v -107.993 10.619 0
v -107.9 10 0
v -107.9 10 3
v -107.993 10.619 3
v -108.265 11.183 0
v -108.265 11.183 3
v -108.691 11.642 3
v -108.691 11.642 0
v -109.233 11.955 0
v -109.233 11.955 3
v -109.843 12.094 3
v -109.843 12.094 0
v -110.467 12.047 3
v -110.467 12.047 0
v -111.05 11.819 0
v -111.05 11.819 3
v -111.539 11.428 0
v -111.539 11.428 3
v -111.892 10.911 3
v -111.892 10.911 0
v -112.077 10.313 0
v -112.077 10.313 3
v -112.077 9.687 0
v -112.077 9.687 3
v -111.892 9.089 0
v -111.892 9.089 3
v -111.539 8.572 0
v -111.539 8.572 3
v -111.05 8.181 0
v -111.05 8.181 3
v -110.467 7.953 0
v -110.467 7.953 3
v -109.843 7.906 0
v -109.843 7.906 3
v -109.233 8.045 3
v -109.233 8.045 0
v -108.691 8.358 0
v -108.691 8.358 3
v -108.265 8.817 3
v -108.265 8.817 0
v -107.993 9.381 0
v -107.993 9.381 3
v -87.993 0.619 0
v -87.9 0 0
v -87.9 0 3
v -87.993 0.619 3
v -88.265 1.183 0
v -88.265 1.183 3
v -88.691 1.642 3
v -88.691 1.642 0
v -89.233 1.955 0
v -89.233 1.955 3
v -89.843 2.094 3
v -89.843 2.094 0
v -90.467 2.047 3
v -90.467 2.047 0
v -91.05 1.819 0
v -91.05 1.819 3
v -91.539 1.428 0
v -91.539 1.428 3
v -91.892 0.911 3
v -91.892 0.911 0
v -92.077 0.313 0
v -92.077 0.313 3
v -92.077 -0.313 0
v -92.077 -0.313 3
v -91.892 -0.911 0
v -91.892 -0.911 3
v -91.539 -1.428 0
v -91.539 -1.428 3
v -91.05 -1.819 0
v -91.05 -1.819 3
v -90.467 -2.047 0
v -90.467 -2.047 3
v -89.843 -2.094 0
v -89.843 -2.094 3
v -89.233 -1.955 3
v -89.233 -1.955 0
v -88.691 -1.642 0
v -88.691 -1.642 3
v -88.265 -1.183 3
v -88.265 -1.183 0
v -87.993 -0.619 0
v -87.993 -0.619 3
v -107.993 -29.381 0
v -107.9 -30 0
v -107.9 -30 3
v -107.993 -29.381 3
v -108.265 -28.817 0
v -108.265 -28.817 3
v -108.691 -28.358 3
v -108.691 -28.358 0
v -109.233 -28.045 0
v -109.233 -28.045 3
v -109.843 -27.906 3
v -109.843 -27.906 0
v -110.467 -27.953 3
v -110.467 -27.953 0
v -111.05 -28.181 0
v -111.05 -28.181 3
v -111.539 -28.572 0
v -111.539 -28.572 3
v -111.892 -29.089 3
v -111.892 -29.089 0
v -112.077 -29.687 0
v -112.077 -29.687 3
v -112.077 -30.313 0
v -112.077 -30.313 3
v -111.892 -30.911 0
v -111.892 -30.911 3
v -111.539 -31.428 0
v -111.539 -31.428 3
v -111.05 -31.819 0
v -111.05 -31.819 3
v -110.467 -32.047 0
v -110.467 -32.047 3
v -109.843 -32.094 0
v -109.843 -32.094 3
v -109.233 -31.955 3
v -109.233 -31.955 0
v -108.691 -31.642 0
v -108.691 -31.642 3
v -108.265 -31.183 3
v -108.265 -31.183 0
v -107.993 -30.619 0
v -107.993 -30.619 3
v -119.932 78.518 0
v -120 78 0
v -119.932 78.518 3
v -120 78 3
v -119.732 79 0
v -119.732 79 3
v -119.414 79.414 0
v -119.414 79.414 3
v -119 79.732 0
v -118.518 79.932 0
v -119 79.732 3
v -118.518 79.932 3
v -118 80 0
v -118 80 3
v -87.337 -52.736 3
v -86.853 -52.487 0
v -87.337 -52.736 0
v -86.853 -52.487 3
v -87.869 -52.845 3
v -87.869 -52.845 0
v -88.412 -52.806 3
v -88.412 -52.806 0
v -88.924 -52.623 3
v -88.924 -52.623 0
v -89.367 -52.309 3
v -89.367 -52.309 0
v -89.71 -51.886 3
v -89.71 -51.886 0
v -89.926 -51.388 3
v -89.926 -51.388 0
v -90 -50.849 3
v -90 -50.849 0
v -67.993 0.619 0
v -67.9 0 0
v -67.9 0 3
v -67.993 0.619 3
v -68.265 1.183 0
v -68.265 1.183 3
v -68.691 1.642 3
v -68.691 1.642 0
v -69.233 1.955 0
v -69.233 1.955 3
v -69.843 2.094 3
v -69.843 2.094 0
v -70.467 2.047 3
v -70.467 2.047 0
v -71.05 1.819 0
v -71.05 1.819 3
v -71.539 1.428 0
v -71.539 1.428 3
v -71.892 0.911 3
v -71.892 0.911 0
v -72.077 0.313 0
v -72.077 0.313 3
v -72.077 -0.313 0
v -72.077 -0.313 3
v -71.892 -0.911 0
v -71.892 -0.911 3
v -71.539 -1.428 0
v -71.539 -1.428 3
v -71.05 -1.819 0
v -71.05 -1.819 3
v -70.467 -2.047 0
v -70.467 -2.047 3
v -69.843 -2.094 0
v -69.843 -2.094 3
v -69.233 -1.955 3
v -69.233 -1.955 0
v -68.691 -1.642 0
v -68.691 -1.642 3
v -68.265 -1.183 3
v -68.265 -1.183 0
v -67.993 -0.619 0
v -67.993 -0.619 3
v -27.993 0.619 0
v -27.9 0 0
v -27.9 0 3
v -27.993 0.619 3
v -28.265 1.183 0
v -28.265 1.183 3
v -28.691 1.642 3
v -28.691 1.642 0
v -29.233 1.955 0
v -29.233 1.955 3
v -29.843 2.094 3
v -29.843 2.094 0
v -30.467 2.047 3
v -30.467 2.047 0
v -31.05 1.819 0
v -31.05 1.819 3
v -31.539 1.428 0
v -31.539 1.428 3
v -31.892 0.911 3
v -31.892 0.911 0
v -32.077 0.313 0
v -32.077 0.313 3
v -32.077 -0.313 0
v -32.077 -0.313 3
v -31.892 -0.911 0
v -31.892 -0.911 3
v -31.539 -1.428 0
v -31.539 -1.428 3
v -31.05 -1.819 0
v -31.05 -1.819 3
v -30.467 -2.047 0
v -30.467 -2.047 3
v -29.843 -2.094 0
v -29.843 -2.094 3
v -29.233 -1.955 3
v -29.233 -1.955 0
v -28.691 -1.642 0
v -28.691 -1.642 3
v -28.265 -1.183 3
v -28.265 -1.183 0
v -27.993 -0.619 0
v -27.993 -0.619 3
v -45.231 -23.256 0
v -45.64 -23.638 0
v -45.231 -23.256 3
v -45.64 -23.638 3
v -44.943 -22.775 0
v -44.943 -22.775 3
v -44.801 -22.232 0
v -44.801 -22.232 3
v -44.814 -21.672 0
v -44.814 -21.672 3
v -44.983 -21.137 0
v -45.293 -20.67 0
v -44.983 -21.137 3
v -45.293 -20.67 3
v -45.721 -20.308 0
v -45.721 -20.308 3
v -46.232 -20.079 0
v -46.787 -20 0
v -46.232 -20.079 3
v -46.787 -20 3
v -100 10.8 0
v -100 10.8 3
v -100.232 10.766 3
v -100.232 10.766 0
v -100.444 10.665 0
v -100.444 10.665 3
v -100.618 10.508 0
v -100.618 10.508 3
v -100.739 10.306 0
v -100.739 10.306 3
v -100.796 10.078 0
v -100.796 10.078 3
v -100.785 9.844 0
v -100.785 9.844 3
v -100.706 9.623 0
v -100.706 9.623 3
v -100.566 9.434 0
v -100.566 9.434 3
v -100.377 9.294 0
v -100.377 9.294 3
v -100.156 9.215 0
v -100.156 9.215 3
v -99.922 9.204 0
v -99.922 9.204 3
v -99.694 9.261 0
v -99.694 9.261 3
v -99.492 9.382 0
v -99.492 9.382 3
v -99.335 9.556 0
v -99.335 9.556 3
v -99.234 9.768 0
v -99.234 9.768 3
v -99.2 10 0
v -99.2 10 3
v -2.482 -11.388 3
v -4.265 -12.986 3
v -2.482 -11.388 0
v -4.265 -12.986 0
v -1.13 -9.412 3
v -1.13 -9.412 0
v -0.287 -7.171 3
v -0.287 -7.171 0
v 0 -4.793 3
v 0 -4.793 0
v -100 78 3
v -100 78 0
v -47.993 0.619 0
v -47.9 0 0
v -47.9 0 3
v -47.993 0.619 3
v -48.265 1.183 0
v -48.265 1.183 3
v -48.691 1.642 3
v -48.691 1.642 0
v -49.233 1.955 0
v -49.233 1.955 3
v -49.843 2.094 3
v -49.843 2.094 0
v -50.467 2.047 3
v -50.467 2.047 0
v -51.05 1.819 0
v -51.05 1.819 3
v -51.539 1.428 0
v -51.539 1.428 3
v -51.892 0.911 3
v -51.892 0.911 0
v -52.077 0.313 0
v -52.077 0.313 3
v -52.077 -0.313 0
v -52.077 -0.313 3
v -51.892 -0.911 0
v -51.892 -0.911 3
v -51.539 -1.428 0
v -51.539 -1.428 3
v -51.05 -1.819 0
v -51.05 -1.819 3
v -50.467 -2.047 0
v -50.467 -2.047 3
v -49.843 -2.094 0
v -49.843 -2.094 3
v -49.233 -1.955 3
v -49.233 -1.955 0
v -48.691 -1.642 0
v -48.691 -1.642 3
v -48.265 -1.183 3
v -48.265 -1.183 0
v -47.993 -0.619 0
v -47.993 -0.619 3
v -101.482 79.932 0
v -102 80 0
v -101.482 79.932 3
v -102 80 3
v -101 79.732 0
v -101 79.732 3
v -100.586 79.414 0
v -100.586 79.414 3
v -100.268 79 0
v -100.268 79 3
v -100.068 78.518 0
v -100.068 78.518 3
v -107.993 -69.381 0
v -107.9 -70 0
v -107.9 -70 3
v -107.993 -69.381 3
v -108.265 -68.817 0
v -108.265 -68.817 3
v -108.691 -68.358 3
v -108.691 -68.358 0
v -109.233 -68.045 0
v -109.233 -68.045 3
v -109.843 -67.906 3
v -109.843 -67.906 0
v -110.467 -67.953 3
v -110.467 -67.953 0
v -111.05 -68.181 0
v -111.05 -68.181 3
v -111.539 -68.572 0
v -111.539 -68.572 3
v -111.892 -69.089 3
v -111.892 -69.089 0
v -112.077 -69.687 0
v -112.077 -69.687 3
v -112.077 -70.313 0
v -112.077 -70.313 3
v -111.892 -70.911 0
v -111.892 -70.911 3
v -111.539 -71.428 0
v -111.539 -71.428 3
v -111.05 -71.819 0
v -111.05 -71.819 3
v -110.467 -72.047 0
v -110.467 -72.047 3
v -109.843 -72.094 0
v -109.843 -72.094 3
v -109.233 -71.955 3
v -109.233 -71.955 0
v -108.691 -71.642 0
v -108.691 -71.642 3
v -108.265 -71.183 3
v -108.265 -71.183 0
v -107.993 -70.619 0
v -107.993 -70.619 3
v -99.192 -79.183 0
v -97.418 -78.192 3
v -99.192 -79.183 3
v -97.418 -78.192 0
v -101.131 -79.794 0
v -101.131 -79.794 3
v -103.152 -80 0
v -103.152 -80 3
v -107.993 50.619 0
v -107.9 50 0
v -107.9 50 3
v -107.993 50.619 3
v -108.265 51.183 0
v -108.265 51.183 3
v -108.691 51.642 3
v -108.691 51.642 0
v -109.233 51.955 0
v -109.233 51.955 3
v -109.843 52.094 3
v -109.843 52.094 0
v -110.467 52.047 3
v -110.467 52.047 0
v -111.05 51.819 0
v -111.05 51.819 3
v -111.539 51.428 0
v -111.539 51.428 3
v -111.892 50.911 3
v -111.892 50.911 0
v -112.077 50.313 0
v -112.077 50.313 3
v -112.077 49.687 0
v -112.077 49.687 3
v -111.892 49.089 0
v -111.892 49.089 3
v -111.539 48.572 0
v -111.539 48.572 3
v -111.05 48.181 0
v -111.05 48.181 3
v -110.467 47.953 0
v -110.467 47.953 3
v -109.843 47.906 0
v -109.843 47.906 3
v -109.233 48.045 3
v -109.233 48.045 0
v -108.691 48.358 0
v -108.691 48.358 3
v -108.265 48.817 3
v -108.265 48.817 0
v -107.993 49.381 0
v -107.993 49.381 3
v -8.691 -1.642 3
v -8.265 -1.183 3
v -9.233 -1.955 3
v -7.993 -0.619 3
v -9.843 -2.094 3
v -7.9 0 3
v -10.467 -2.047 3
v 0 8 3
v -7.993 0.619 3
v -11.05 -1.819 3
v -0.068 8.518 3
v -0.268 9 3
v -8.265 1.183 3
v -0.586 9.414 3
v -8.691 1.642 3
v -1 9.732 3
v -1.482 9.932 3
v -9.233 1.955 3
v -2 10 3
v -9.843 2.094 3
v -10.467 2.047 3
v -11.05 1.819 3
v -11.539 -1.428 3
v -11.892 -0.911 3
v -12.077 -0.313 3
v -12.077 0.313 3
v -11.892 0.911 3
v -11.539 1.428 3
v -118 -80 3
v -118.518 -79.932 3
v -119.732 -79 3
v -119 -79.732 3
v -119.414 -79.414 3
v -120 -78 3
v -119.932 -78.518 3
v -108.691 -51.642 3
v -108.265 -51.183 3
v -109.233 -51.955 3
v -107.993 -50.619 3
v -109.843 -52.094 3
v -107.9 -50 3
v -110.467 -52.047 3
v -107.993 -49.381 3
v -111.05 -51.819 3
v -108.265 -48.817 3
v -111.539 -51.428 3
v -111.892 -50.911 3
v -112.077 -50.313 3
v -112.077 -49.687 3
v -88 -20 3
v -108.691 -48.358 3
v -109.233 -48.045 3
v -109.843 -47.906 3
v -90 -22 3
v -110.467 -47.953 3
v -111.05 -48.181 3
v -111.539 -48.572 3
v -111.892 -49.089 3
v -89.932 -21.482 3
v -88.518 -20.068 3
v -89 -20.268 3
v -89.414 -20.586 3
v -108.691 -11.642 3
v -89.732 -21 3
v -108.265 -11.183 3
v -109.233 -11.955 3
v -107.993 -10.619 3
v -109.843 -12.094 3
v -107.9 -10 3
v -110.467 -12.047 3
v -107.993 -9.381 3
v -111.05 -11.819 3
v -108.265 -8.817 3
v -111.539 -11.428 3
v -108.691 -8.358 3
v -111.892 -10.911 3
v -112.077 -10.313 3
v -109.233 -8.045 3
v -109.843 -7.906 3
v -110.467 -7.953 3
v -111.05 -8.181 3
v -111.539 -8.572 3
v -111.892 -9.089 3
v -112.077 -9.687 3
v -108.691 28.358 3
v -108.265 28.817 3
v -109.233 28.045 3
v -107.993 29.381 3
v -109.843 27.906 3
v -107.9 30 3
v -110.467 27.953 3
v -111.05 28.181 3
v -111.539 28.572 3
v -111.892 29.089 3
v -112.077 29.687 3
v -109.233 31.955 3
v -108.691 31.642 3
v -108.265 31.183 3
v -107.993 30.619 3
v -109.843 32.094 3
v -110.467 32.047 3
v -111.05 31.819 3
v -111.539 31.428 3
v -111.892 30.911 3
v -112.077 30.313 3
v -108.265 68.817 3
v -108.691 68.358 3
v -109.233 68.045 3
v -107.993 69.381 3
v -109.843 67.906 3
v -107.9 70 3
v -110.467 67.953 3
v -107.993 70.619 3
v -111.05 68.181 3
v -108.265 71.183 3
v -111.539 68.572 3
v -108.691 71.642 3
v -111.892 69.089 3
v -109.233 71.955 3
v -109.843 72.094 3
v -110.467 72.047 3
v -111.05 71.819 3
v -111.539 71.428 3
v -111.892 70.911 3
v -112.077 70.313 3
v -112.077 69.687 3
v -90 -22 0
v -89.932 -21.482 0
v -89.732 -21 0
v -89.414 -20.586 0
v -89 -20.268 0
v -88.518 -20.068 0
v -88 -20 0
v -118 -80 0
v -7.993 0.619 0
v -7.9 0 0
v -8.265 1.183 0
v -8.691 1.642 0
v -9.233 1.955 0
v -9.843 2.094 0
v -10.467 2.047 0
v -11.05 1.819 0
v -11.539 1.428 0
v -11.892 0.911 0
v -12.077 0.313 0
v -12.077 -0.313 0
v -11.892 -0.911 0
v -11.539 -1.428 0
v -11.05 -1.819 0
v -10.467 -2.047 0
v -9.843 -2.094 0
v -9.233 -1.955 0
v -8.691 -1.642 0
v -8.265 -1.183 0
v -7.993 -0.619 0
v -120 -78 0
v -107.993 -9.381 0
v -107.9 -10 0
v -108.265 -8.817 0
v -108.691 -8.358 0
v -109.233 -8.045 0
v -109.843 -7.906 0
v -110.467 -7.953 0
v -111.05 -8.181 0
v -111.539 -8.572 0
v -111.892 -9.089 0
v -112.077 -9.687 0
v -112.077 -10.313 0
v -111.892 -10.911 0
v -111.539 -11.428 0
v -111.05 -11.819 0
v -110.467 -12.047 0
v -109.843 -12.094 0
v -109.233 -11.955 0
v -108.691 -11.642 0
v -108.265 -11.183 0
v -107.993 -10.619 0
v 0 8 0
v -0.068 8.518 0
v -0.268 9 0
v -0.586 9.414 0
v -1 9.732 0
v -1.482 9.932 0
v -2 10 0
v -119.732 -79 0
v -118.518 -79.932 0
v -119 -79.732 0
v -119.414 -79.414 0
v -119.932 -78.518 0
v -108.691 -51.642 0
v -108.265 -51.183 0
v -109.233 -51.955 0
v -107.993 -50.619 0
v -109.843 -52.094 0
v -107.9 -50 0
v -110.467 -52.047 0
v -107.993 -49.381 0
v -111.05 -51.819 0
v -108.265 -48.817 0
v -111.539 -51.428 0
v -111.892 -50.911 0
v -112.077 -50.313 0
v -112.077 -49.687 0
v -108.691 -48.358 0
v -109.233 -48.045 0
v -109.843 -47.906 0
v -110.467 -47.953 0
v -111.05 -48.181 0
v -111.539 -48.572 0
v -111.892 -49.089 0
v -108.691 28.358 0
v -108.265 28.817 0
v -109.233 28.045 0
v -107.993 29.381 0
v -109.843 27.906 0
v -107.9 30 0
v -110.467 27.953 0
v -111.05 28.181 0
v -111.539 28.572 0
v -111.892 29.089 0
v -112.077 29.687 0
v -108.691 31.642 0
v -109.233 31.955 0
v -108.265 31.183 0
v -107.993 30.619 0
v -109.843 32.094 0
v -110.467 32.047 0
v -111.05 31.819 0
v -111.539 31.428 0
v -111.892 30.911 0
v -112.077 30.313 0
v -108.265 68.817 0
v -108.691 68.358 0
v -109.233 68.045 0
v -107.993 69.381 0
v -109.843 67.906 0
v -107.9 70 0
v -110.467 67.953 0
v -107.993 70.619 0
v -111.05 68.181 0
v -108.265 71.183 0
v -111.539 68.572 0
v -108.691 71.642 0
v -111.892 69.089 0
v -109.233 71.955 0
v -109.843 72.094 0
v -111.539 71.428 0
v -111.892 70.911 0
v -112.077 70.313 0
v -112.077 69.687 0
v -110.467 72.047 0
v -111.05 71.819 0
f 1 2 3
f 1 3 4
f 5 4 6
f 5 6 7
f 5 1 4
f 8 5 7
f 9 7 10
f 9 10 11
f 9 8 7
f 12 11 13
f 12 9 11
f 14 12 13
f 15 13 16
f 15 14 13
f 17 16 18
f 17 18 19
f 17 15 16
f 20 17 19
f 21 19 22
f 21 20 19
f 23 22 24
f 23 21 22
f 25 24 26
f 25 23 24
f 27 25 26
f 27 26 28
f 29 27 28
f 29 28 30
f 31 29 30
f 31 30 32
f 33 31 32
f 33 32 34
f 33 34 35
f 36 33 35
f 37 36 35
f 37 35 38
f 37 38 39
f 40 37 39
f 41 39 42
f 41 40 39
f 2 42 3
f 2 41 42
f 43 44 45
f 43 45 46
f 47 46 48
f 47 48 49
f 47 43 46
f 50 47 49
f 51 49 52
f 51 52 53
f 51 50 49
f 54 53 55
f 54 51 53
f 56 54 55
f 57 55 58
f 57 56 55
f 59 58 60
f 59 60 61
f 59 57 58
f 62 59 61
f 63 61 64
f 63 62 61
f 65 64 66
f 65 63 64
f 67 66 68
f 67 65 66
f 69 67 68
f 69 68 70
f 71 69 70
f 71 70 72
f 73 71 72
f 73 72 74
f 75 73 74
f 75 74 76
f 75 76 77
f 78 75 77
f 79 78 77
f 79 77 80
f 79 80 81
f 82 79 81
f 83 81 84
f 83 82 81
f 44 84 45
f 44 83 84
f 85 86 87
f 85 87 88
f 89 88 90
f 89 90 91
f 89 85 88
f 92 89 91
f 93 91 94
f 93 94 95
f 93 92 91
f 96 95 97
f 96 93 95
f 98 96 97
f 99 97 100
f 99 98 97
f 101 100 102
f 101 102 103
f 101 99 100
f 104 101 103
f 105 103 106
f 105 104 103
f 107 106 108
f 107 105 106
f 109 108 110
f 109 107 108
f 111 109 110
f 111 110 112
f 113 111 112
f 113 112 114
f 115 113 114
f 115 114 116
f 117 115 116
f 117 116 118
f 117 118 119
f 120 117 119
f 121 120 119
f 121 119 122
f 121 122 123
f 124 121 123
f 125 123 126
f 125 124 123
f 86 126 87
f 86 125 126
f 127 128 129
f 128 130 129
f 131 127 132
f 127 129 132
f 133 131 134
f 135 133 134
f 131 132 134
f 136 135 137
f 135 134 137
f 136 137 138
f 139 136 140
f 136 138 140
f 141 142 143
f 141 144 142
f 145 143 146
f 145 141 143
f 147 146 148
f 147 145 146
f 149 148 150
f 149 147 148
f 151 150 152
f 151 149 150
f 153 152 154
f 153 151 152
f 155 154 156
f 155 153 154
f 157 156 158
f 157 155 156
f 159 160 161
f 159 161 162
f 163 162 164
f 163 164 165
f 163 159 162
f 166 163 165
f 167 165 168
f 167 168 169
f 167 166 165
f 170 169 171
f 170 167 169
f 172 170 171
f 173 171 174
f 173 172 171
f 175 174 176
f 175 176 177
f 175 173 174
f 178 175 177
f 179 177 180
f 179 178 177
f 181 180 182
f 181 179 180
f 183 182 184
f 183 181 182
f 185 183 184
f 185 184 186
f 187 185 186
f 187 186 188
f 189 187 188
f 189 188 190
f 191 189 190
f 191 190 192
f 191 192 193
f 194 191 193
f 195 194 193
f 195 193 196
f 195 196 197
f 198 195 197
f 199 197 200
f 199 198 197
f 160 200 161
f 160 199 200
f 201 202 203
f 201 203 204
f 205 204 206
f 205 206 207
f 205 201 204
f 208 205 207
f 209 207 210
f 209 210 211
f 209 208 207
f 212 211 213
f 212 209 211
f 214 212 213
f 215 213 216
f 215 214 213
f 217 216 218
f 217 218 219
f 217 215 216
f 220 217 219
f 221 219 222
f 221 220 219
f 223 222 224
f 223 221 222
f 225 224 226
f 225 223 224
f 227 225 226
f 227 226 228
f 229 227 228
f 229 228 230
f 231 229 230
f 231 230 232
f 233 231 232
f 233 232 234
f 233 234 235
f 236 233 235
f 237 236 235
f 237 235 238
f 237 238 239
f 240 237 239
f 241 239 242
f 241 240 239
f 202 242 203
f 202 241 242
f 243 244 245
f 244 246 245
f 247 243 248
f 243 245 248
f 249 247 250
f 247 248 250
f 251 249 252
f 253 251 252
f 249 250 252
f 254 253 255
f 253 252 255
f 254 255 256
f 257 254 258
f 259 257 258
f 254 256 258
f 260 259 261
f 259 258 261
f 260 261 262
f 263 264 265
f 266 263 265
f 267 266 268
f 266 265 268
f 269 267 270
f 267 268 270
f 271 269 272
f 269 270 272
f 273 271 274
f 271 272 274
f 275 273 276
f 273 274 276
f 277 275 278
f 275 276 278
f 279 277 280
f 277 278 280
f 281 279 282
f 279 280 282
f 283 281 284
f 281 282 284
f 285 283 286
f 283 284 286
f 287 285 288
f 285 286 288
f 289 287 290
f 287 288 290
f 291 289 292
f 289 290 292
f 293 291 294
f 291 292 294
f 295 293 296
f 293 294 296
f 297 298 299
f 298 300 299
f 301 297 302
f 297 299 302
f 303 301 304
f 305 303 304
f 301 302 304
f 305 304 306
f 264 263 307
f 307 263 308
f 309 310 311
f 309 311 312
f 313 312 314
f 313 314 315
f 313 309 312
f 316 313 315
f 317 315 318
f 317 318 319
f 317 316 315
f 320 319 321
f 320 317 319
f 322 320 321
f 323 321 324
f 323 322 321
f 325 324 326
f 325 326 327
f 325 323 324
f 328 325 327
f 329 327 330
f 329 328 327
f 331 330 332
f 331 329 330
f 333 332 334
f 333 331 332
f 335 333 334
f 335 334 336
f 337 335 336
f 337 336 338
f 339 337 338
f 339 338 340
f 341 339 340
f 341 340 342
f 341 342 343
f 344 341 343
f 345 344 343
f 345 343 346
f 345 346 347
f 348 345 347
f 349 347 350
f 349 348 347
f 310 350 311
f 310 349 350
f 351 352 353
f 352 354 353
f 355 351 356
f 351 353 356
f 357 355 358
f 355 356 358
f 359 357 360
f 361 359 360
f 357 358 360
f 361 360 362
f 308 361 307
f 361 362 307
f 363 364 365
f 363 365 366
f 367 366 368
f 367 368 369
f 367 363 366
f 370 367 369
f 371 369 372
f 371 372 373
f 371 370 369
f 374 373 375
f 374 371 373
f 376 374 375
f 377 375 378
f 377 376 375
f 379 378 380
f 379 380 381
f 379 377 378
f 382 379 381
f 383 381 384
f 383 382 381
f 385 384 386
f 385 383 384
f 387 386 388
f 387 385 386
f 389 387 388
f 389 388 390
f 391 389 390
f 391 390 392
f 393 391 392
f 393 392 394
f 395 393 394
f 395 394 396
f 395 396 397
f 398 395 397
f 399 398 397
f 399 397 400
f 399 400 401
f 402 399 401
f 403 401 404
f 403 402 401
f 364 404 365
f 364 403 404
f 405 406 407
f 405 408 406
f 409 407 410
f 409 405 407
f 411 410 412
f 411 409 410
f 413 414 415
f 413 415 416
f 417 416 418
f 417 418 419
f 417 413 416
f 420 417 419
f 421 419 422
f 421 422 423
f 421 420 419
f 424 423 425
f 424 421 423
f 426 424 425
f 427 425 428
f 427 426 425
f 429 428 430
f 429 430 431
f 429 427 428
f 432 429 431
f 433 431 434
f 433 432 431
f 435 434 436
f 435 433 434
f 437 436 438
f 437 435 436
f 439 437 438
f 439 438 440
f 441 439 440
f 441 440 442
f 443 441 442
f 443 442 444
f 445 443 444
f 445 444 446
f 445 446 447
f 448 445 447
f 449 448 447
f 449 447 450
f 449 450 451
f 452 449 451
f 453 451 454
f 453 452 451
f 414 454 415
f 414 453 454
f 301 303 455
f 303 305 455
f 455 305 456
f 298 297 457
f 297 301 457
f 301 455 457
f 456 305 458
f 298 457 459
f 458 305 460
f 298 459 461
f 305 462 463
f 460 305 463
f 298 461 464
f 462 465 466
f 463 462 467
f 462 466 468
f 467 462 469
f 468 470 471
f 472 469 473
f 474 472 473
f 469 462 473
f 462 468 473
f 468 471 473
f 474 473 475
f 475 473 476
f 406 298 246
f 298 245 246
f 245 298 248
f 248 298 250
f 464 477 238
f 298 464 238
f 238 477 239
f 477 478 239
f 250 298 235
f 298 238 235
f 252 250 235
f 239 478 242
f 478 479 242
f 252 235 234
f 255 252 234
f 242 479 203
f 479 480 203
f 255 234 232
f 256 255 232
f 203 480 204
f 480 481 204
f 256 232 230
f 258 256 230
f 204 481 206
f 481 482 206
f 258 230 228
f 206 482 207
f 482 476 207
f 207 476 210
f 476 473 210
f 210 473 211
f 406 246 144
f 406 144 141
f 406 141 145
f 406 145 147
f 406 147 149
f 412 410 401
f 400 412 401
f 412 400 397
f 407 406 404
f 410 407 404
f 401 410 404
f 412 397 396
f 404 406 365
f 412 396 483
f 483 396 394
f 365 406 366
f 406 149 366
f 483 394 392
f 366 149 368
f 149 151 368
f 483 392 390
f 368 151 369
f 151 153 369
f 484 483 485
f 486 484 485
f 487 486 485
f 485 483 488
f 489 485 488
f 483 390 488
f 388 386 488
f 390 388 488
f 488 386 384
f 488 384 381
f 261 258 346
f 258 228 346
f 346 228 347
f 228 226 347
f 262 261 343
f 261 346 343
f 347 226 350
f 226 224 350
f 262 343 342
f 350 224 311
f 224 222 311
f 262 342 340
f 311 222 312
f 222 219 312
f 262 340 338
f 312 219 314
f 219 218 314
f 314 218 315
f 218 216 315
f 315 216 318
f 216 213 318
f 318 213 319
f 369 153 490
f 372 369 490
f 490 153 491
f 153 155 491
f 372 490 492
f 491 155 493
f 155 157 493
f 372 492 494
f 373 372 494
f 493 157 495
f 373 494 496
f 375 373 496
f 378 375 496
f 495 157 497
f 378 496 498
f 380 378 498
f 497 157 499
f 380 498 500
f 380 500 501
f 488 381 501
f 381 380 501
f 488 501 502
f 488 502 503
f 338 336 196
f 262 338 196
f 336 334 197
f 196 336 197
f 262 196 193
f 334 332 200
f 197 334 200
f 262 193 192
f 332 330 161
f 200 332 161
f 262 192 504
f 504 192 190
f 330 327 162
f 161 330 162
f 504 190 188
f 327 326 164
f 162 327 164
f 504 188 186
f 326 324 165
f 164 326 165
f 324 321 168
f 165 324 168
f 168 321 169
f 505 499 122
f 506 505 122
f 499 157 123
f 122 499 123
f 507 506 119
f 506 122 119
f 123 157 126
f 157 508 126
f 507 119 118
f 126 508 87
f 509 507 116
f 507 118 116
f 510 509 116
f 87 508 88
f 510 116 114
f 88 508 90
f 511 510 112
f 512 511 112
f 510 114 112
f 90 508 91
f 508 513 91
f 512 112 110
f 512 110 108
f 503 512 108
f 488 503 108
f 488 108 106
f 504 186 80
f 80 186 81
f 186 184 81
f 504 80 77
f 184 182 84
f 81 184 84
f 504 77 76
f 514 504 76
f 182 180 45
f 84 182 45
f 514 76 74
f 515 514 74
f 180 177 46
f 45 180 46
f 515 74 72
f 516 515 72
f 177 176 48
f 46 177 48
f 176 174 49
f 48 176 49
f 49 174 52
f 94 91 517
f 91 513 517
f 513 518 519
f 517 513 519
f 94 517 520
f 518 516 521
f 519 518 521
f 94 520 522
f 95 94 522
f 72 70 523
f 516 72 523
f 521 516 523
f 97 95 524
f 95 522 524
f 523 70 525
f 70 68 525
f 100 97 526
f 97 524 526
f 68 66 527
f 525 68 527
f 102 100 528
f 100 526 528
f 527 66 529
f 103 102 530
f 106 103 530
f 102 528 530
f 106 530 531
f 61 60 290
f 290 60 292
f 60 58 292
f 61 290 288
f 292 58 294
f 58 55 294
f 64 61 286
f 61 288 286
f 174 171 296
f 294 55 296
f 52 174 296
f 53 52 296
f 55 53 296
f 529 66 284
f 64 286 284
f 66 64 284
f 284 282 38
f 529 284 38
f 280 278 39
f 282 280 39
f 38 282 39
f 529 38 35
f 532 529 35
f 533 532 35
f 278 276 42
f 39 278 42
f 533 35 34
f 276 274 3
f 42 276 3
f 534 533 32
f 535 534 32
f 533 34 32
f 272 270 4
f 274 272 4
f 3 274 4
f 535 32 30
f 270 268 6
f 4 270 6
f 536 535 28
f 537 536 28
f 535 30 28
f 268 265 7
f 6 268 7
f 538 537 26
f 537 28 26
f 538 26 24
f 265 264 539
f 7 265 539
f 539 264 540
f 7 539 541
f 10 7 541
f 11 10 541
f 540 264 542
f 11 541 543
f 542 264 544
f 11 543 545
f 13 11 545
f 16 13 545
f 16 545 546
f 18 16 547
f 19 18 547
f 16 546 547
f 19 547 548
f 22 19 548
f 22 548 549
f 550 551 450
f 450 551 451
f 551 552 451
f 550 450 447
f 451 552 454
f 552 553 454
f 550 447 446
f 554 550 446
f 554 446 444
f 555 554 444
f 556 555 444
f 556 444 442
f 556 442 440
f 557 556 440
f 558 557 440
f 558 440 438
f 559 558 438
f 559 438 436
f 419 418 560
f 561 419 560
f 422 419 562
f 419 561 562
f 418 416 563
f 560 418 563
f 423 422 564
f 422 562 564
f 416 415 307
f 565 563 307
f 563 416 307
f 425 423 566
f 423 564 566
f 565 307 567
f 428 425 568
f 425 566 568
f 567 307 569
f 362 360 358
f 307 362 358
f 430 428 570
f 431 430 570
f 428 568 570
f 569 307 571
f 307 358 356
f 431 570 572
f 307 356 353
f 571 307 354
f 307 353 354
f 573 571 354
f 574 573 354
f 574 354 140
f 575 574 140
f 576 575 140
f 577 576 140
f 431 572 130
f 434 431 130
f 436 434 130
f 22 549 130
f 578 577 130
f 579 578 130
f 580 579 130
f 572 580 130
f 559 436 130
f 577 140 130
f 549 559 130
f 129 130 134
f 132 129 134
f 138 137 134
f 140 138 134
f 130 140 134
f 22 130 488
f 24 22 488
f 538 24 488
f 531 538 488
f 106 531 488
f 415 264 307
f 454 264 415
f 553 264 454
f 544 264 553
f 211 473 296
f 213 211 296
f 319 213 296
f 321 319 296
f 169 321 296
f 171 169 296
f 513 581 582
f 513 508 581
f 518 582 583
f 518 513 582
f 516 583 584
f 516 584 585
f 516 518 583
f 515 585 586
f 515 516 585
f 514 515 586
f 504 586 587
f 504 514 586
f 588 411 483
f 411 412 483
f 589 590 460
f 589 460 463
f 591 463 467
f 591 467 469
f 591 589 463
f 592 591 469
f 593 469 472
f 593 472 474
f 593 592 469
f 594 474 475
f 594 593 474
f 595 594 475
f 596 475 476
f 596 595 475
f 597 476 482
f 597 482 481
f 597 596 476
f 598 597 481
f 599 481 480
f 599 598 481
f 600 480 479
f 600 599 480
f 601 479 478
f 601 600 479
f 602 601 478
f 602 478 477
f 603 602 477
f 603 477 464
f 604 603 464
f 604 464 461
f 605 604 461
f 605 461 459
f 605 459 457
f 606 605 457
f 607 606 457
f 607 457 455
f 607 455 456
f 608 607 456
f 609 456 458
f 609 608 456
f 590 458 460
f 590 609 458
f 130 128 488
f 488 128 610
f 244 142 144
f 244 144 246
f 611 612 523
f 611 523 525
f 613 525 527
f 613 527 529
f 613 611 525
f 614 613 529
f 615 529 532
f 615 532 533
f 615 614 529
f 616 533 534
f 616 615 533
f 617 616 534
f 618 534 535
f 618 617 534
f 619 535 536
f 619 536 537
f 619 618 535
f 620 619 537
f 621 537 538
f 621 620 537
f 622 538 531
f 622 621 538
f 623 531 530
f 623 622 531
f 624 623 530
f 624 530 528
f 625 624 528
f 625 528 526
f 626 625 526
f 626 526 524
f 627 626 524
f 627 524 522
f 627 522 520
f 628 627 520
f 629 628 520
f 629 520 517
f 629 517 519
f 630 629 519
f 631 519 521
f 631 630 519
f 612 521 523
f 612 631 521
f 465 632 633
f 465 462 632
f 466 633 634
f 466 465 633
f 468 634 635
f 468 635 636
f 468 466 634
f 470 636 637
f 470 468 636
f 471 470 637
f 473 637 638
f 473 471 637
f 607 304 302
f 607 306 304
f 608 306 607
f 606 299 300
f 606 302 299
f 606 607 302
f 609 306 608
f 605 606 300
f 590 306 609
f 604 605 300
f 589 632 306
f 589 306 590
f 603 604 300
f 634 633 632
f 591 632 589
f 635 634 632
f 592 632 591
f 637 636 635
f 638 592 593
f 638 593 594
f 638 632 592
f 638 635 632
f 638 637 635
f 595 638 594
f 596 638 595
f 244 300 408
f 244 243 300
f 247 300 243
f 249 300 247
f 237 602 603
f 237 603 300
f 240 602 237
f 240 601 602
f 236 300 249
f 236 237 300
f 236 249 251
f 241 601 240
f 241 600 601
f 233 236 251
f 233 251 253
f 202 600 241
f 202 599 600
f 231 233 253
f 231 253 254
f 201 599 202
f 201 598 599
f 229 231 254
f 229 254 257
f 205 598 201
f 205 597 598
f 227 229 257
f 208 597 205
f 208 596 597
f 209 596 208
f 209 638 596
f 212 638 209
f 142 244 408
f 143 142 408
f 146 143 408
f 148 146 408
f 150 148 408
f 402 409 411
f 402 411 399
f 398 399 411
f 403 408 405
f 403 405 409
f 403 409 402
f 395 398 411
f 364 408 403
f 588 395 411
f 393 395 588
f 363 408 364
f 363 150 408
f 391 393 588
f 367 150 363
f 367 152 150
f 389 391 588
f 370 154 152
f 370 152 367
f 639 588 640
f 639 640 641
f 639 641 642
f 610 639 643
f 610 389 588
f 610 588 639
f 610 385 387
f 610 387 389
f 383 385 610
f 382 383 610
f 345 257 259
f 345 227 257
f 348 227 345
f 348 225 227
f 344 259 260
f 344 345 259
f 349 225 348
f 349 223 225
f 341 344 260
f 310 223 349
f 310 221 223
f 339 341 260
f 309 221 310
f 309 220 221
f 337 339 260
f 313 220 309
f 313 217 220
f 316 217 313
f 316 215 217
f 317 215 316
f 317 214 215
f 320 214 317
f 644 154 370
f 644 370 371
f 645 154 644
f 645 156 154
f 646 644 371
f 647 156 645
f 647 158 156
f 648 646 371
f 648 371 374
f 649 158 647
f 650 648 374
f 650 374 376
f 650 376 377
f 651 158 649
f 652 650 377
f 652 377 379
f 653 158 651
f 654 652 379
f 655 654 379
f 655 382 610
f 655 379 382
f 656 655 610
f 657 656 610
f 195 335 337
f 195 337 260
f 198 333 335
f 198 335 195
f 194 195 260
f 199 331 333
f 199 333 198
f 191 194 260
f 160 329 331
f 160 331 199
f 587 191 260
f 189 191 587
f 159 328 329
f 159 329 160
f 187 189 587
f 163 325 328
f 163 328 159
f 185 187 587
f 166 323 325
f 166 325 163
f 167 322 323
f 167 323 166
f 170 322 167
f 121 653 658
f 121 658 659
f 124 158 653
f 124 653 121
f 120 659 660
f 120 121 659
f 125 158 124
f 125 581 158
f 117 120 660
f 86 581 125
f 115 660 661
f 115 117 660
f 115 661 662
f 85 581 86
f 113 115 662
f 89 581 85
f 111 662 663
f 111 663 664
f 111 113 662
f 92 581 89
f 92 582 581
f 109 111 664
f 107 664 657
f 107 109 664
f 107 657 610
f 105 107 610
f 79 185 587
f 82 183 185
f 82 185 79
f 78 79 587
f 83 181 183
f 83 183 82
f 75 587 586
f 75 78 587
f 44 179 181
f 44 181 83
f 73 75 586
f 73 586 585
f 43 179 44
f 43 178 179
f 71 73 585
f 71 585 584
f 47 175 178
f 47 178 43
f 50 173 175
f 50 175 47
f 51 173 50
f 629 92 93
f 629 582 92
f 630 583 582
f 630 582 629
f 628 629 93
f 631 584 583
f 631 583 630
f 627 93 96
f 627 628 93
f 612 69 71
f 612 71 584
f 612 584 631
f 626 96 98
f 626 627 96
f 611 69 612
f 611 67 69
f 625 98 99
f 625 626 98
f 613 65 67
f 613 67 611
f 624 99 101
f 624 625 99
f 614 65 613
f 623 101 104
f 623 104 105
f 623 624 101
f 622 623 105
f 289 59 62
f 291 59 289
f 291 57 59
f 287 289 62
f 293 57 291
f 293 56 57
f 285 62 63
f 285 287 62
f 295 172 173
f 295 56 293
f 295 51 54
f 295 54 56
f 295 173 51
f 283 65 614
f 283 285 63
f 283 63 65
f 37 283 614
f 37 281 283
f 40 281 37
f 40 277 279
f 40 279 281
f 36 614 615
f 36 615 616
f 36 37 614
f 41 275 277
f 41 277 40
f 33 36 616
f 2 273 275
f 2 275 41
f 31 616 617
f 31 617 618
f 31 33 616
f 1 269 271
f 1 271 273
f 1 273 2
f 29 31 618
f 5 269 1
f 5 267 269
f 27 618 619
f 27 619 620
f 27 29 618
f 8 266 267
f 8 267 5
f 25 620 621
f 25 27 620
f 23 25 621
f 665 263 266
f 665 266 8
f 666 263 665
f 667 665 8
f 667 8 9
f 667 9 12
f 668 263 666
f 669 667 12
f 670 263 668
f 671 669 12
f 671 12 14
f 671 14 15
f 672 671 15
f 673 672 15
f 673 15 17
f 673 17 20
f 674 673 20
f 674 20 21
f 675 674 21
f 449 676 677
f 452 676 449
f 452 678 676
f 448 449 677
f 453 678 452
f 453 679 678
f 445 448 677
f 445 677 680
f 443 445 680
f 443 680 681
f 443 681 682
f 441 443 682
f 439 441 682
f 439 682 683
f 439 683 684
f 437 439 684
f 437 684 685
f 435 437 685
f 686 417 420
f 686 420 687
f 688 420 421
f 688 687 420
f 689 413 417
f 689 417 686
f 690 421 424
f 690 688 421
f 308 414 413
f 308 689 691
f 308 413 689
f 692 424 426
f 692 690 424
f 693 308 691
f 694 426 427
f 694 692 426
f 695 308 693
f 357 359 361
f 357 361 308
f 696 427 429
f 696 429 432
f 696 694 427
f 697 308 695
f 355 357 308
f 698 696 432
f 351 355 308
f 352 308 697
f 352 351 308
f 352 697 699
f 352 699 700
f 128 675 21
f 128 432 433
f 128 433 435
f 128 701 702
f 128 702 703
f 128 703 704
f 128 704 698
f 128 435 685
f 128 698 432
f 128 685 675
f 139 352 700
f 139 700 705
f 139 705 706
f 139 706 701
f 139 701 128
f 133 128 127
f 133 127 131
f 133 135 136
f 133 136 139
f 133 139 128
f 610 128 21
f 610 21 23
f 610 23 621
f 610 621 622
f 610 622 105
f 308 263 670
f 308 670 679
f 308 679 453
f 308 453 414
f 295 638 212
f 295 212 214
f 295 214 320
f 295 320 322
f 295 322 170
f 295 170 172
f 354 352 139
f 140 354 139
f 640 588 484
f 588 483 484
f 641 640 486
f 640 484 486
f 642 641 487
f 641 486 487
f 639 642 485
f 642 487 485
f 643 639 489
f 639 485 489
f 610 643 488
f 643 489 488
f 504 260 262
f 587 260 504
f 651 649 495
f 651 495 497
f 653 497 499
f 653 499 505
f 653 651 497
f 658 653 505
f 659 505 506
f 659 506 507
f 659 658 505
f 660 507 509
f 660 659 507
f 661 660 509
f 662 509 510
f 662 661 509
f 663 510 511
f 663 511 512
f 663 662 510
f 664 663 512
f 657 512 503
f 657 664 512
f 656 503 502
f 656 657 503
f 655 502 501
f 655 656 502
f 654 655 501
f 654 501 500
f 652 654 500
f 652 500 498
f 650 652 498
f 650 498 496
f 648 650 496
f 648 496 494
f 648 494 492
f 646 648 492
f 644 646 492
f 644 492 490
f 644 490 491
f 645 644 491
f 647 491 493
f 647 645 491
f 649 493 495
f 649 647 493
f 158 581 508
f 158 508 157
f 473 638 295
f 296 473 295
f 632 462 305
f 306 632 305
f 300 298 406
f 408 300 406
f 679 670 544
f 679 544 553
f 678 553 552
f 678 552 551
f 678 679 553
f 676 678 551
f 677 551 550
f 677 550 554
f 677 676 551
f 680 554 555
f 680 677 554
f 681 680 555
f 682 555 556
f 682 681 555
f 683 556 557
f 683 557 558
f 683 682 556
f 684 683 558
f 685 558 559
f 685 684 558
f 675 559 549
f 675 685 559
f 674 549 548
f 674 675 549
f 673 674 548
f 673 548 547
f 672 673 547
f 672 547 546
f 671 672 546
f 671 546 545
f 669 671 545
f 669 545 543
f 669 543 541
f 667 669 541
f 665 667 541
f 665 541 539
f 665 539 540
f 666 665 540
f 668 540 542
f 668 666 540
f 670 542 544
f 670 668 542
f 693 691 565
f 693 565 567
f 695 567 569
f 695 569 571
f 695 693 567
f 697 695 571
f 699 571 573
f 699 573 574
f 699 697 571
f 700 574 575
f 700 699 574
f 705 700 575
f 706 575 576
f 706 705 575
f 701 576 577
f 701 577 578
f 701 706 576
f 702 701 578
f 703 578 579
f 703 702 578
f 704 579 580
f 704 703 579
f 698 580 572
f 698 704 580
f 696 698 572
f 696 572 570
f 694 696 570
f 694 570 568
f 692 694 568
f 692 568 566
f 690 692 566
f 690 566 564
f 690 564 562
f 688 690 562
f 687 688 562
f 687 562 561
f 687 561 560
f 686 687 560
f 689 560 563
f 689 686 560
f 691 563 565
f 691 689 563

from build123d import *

# Parameters (mm, degrees)
SKETCH1_R           = 2.1
BOSS_EXTRUDE1_DEPTH = 3
FILLET1_R           = 2
SKETCH3_R           = 0.8
CUT_EXTRUDE1_DEPTH  = 145.25324953
BOSS_EXTRUDE2_START = -3
BOSS_EXTRUDE2_DEPTH = 3
CUT_EXTRUDE2_DEPTH  = 145.25324953
FILLET2_R           = 2
FILLET3_R           = 10


with BuildPart() as part:
    # Sketch1 → Boss-Extrude1 (new body)
    with BuildSketch(Plane.XY):
        Polygon((-100, -80), (-100, -10), (0, -10), (0, 10), (-100, 10), (-100, 80), (-120, 80), (-120, -80), align=None)
        with Locations((-110, 70)):
            Circle(SKETCH1_R, mode=Mode.SUBTRACT)
        with Locations((-110, 50)):
            Circle(SKETCH1_R, mode=Mode.SUBTRACT)
        with Locations((-110, 30)):
            Circle(SKETCH1_R, mode=Mode.SUBTRACT)
        with Locations((-110, 10)):
            Circle(SKETCH1_R, mode=Mode.SUBTRACT)
        with Locations((-110, -10)):
            Circle(SKETCH1_R, mode=Mode.SUBTRACT)
        with Locations((-110, -30)):
            Circle(SKETCH1_R, mode=Mode.SUBTRACT)
        with Locations((-110, -50)):
            Circle(SKETCH1_R, mode=Mode.SUBTRACT)
        with Locations((-110, -70)):
            Circle(SKETCH1_R, mode=Mode.SUBTRACT)
        with Locations((-10, 0)):
            Circle(SKETCH1_R, mode=Mode.SUBTRACT)
        with Locations((-30, 0)):
            Circle(SKETCH1_R, mode=Mode.SUBTRACT)
        with Locations((-50, 0)):
            Circle(SKETCH1_R, mode=Mode.SUBTRACT)
        with Locations((-70, 0)):
            Circle(SKETCH1_R, mode=Mode.SUBTRACT)
        with Locations((-90, 0)):
            Circle(SKETCH1_R, mode=Mode.SUBTRACT)
    extrude(amount=BOSS_EXTRUDE1_DEPTH)

    # Fillet1
    fillet1_edges = [part.edges().sort_by_distance(p)[0] for p in [
        (-120, -80, 1.5),
        (-120, 80, 1.5),
        (-100, 80, 1.5),
        (0, 10, 1.5),
        (0, -10, 1.5),
        (-100, -80, 1.5),
    ]]
    fillet(fillet1_edges, radius=FILLET1_R)

    # Sketch3 → Cut-Extrude1 (cut, through all)
    with BuildSketch(Plane.XY.offset(3)):
        with Locations((-100, 10)):
            Circle(SKETCH3_R)
        with Locations((-100, -10)):
            Circle(SKETCH3_R)
    extrude(amount=-CUT_EXTRUDE1_DEPTH, mode=Mode.SUBTRACT)

    # Sketch4 → Boss-Extrude2 (add)
    with BuildSketch(Plane(origin=(0, 0, 0), x_dir=(-1, 0, 0), z_dir=(0, 0, -1)).offset(BOSS_EXTRUDE2_START)):
        with BuildLine():
            Line((0, -8), (0, -10))
            Line((0, -10), (100, -80))
            Line((100, -80), (102, -80))
            ThreePointArc((102, -80), (100.585786438, -79.414213562), (100, -78))
            Line((100, -78), (100, -10.8))
            ThreePointArc((100, -10.8), (100.565685425, -9.434314575), (99.2, -10))
            Line((99.2, -10), (2, -10))
            ThreePointArc((2, -10), (0.585786438, -9.414213562), (0, -8))
        make_face()
    extrude(amount=BOSS_EXTRUDE2_DEPTH)

    # Sketch5 → Cut-Extrude2 (cut, through all)
    with BuildSketch(Plane(origin=(0, 0, 0), x_dir=(-1, 0, 0), z_dir=(0, 0, -1))):
        Polygon((40.442619177, -20), (90, -20), (90, -54.690166576), align=None)
    extrude(amount=-CUT_EXTRUDE2_DEPTH, mode=Mode.SUBTRACT)

    # Fillet2
    fillet2_edges = [part.edges().sort_by_distance(p)[0] for p in [
        (-90, -54.690166576, 1.5),
        (-40.442619177, -20, 1.5),
        (-90, -20, 1.5),
    ]]
    fillet(fillet2_edges, radius=FILLET2_R)

    # Fillet3
    fillet3_edges = [part.edges().sort_by_distance(p)[0] for p in [
        (-100, -80, 1.5),
        (0, -10, 1.5),
    ]]
    fillet(fillet3_edges, radius=FILLET3_R)


solid = part.part
